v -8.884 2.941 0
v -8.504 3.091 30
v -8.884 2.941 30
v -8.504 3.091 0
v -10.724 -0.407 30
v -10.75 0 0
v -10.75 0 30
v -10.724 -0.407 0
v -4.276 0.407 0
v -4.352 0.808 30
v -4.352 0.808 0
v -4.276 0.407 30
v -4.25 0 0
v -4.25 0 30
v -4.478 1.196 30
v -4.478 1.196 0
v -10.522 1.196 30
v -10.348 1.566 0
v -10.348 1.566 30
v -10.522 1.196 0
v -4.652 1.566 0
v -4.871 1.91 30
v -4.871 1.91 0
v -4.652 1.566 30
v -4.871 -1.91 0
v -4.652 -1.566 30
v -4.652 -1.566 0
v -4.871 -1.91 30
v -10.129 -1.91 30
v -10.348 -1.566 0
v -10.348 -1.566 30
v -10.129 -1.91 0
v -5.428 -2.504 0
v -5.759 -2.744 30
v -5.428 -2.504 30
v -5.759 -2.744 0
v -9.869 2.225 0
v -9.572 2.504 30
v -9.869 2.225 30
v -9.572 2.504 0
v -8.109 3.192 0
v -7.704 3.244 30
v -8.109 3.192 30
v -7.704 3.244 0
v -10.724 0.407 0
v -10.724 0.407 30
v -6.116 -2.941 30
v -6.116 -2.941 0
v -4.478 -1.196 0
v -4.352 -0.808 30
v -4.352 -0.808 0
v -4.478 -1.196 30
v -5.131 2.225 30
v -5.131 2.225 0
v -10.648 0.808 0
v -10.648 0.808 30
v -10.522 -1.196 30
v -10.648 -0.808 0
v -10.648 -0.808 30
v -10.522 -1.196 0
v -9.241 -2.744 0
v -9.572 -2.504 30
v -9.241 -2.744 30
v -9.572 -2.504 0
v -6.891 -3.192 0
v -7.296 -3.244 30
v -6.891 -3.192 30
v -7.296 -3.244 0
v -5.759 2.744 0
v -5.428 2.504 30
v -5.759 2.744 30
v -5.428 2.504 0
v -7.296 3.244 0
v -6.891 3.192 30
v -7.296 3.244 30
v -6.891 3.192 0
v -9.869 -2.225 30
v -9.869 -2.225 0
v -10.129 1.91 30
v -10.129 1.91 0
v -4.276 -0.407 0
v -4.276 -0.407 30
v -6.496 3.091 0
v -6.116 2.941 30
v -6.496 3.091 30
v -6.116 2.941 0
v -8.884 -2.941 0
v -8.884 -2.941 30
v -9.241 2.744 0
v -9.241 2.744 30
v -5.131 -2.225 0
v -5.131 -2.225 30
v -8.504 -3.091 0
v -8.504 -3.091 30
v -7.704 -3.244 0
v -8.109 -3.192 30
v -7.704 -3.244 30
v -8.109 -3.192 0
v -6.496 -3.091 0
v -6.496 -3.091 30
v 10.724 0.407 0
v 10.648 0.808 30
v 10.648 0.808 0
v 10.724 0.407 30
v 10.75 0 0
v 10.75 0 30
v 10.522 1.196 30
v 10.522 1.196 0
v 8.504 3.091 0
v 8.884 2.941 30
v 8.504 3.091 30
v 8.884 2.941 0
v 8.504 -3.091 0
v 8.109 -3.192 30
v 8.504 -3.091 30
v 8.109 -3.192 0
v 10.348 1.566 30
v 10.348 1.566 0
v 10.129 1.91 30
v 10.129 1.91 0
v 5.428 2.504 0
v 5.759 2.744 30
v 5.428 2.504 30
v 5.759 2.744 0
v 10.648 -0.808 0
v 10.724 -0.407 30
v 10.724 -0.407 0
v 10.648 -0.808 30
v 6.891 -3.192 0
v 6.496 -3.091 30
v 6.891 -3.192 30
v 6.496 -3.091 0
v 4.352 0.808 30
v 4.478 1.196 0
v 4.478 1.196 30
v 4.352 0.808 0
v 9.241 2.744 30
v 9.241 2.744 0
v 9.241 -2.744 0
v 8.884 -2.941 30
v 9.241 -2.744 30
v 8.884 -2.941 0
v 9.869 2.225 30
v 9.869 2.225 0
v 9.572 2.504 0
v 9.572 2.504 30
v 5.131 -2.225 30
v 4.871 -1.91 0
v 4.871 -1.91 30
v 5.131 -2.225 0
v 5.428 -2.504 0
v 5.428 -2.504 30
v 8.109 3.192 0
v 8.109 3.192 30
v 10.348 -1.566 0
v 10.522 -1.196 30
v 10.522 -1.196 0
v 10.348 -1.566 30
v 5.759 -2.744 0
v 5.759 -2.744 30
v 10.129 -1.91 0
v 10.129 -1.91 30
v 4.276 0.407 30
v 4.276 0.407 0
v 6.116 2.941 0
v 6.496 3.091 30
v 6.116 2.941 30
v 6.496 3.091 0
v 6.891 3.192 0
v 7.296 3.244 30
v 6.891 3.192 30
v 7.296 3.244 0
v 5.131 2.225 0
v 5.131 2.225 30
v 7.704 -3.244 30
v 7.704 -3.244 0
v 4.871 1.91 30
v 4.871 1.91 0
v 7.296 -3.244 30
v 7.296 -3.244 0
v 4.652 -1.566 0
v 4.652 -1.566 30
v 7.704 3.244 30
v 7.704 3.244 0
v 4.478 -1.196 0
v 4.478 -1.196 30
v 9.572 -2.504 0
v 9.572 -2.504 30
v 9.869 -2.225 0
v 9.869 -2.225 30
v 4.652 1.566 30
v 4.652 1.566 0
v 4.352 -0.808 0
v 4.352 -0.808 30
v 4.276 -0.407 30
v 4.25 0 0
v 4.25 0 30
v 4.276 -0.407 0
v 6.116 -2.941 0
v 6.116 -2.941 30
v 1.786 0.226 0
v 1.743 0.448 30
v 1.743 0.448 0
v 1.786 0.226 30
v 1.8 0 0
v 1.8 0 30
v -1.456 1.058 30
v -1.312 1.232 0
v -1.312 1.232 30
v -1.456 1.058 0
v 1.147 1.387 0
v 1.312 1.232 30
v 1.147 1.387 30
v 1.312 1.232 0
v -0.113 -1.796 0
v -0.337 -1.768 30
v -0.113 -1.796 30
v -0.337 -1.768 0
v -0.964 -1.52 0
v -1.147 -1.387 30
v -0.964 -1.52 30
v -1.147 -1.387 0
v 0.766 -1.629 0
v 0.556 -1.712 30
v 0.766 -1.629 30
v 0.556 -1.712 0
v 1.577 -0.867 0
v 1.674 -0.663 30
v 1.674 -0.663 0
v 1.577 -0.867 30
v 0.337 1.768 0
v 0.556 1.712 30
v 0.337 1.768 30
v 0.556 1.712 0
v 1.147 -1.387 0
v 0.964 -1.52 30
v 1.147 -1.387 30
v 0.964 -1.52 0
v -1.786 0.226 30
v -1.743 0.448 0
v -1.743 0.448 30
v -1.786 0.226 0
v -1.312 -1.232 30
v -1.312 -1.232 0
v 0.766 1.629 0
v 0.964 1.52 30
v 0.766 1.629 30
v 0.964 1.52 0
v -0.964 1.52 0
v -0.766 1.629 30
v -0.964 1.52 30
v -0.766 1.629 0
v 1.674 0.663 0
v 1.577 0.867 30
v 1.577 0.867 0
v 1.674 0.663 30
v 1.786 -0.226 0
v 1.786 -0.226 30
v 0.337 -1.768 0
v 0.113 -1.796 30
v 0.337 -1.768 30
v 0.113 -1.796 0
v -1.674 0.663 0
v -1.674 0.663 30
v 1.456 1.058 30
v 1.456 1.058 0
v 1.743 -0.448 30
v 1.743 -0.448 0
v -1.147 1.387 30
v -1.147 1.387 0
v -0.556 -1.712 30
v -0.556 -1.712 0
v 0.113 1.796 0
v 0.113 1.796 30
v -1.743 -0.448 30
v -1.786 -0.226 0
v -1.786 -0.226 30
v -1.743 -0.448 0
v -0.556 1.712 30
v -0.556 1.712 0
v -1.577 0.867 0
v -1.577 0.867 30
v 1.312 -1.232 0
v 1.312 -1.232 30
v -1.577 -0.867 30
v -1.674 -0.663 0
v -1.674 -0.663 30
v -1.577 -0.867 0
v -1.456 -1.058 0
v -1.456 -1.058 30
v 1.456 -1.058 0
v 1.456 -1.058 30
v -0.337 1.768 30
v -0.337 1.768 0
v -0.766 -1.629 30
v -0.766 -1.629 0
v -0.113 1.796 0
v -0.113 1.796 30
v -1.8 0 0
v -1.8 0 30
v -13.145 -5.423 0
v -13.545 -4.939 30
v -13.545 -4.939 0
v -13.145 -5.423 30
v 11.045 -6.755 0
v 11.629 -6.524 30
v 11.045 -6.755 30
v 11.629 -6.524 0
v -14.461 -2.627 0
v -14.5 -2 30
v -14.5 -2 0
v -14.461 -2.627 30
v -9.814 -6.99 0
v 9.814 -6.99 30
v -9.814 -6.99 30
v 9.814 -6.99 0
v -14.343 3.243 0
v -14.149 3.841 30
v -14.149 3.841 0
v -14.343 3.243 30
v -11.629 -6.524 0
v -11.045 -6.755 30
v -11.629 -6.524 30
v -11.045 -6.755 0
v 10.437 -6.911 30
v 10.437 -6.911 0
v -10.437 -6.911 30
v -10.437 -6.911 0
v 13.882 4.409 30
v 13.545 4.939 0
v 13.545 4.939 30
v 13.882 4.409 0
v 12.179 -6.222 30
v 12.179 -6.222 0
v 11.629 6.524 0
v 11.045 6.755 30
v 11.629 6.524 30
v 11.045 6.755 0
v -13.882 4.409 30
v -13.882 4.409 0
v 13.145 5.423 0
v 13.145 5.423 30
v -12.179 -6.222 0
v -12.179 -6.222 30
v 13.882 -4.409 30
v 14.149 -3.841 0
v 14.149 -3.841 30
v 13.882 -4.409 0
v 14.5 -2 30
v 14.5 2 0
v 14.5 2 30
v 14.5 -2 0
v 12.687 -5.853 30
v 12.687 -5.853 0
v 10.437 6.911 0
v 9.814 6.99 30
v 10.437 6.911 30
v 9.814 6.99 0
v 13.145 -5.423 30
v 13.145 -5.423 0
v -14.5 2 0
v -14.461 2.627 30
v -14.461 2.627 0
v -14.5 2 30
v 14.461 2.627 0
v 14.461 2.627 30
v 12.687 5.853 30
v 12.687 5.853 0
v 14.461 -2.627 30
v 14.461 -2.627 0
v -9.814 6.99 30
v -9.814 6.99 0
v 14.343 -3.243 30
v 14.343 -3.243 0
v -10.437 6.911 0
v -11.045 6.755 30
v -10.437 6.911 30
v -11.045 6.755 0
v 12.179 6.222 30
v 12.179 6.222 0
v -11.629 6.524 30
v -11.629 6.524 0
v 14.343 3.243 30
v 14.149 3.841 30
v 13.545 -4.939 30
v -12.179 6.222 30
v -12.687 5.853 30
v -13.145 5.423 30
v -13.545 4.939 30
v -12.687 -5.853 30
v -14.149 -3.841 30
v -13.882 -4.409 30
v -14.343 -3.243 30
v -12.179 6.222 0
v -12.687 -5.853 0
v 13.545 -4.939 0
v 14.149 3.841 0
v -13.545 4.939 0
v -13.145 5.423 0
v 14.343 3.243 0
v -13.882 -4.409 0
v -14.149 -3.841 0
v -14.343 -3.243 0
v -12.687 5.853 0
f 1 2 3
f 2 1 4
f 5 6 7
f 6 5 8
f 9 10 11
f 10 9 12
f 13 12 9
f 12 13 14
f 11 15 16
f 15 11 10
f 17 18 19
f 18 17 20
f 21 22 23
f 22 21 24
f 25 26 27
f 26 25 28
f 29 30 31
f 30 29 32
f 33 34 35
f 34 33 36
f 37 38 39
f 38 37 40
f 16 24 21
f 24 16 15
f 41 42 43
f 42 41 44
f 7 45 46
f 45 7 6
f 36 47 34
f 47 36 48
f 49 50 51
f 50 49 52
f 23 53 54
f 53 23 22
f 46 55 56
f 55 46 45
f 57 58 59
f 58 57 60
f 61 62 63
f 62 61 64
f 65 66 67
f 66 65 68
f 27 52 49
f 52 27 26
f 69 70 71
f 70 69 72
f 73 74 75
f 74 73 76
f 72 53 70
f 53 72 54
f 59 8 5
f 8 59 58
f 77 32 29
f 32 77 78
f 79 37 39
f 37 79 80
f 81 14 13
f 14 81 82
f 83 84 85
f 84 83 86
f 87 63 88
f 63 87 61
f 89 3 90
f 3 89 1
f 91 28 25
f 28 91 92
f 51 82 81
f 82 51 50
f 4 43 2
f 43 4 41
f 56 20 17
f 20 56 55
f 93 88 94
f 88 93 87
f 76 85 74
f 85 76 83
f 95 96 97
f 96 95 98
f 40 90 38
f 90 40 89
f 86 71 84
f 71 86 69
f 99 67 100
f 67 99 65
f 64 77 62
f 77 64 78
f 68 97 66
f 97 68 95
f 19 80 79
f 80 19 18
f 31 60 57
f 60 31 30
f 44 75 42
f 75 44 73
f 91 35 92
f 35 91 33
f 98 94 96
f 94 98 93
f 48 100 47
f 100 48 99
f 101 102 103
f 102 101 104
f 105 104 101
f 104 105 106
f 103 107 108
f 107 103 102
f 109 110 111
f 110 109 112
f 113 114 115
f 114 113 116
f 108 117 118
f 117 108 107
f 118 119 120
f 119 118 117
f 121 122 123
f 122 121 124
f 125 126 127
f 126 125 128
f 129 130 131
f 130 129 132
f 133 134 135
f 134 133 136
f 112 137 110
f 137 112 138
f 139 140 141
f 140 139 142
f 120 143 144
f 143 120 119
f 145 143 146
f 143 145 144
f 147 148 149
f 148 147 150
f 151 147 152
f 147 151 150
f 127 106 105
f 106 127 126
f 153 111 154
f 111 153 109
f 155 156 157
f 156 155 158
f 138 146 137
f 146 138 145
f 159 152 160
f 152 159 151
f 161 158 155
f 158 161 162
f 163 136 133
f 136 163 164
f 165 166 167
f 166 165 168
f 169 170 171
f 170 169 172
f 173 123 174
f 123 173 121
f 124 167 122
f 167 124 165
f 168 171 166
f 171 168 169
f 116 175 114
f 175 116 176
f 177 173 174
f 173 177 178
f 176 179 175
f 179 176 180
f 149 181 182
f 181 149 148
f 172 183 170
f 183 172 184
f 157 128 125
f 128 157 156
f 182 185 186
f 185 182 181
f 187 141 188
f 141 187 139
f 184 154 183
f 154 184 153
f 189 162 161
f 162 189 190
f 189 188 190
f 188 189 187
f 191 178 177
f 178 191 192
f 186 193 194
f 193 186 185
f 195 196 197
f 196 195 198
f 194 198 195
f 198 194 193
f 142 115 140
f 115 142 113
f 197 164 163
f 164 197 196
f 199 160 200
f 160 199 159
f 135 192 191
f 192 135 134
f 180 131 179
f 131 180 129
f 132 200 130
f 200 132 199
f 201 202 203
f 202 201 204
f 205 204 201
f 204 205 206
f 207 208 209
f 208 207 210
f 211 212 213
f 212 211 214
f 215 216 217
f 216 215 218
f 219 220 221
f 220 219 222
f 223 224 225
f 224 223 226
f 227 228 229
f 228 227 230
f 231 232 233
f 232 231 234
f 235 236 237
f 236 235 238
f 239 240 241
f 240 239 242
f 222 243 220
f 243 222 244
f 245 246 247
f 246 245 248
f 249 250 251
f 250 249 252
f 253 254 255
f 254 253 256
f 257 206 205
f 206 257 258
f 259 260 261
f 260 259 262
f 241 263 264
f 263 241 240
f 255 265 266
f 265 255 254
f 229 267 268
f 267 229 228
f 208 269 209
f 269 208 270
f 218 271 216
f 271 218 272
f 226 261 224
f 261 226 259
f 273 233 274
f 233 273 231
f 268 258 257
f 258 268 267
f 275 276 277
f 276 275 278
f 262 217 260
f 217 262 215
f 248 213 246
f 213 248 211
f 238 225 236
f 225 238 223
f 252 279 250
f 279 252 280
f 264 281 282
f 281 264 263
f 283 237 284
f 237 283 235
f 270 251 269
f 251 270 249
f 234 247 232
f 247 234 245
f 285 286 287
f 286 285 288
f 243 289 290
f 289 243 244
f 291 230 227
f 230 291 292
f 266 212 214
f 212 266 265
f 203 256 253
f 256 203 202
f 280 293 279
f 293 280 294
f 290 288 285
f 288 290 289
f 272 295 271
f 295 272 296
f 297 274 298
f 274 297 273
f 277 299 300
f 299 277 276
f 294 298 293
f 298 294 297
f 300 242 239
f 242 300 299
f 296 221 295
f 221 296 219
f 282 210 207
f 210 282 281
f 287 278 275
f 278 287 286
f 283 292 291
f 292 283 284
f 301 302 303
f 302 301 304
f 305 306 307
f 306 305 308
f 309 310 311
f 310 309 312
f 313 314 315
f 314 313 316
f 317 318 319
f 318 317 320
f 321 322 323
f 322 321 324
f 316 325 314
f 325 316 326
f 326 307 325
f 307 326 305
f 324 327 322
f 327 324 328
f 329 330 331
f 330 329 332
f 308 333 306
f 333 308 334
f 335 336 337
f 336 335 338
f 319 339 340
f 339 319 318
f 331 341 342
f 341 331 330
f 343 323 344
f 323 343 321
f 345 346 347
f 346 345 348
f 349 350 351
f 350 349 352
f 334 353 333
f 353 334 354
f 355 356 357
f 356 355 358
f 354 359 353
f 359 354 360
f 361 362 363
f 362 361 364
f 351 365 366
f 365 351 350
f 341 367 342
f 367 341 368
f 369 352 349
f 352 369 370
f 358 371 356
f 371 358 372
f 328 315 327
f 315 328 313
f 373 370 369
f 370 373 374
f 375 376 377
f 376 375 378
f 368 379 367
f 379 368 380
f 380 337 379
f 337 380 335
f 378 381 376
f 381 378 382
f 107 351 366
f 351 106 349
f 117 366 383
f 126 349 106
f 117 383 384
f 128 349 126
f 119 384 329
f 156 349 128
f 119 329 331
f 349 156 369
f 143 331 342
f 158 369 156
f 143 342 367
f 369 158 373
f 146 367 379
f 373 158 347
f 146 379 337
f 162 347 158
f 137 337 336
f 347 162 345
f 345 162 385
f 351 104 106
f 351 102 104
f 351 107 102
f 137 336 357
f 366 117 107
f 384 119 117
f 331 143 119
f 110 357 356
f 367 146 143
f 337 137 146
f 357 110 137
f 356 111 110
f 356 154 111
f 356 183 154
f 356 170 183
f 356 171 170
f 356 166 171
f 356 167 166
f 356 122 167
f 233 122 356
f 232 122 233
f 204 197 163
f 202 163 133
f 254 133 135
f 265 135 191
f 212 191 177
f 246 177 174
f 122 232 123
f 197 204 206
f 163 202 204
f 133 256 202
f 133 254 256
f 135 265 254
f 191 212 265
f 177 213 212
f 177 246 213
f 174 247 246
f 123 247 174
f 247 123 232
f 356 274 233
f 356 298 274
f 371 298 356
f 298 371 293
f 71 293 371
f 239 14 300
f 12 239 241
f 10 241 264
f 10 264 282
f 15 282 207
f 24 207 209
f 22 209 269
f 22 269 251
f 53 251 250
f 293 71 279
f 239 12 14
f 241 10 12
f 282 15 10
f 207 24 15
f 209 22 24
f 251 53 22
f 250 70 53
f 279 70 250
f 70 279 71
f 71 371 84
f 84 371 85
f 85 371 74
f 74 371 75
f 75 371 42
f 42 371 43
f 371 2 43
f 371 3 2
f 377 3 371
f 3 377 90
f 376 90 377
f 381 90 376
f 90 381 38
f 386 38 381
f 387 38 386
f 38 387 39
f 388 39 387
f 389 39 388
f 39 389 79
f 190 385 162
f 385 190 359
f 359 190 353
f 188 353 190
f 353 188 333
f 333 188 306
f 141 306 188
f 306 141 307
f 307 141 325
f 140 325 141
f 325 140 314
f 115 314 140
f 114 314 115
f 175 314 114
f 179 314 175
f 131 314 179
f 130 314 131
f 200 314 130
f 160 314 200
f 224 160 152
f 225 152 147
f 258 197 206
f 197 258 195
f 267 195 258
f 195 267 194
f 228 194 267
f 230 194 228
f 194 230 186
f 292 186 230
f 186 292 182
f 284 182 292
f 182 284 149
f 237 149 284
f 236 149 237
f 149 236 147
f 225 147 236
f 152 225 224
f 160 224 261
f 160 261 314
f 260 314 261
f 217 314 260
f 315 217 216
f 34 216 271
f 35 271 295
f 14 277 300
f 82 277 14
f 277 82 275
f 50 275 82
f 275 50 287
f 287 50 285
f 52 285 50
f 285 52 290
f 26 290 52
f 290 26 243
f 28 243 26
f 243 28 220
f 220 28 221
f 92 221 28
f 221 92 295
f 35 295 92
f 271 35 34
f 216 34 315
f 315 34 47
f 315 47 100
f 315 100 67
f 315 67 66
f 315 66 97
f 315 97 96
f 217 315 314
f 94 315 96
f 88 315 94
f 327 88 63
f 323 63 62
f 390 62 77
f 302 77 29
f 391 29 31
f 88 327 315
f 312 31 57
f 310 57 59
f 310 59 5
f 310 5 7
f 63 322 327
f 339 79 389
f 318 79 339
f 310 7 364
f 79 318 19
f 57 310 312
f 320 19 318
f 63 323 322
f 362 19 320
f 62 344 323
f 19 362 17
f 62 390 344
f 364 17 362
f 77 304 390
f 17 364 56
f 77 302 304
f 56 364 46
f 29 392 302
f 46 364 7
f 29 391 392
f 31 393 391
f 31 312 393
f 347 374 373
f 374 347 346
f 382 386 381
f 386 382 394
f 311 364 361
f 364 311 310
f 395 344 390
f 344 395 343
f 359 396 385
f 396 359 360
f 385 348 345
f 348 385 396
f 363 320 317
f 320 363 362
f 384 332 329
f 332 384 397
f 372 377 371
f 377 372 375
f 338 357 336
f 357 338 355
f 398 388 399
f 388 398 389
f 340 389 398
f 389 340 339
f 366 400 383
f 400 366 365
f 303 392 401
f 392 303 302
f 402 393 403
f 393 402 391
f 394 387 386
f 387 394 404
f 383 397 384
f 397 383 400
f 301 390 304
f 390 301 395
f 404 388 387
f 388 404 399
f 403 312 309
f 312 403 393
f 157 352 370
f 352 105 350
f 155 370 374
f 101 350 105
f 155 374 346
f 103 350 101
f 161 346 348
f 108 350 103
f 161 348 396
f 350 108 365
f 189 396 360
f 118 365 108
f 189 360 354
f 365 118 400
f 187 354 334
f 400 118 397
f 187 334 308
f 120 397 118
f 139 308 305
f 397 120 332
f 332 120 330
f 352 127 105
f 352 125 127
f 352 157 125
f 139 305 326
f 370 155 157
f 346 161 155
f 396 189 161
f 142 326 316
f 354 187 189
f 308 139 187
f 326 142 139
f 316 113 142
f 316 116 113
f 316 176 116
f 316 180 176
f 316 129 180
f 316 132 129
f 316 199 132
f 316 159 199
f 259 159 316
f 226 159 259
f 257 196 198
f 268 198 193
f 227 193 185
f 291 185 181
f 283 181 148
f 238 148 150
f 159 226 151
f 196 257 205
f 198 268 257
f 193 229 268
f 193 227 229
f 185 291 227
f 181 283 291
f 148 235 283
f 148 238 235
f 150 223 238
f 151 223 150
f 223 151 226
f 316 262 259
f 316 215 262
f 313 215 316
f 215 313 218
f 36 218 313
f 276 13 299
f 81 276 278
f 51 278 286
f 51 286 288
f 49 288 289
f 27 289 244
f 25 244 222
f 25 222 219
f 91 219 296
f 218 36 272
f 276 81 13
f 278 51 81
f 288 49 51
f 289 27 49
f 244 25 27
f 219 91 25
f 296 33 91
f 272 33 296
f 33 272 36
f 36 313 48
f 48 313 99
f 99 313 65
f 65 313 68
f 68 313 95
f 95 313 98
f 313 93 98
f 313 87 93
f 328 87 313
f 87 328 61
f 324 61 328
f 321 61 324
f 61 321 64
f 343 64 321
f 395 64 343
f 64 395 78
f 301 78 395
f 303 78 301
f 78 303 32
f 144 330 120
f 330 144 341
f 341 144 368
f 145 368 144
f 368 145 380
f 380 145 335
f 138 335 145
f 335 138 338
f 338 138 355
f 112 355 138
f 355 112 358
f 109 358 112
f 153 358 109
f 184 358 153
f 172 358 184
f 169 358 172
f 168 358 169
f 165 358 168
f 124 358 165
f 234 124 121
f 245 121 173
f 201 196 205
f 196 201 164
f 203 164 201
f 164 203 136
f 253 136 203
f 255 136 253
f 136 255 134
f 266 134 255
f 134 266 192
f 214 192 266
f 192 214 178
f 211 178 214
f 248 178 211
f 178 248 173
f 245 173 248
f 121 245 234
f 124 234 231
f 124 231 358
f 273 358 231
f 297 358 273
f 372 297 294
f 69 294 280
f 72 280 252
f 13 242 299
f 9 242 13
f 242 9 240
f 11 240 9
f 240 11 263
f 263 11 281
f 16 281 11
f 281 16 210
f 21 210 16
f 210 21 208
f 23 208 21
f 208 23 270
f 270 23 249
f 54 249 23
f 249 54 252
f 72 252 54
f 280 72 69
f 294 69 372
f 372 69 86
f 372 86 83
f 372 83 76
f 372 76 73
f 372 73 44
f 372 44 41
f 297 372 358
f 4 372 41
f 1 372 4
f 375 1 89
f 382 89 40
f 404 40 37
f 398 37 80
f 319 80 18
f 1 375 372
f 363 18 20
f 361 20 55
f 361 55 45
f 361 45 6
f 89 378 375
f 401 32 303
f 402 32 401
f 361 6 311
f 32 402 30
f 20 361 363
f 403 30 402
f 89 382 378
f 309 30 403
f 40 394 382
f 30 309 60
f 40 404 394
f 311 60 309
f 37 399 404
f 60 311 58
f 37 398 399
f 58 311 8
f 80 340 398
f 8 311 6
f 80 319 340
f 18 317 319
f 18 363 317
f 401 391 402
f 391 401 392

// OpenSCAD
$fn = 50;


difference() {
	union() {
		*color(alpha = 1.0000000000, c = "gray") {
			translate(v = [0, 7, 0]) {
				linear_extrude(height = 1) {
					text(font = "Arial:style=Bold", halign = "center", size = 4.5000000000, text = "COMMENT plate main", valign = "center");
				}
			}
		}
		*color(alpha = 1.0000000000, c = "gray") {
			translate(v = [0, 14, 0]) {
				linear_extrude(height = 1) {
					text(font = "Arial:style=Bold", halign = "center", size = 4.5000000000, text = "COMMENT description oobb_plate_shape_p_type_30_depth_2_width_1_height_30_thickness_true_both_holes", valign = "center");
				}
			}
		}
		hull() {
			translate(v = [-9.5000000000, 2.0000000000, 0]) {
				cylinder(h = 30, r = 5);
			}
			translate(v = [9.5000000000, 2.0000000000, 0]) {
				cylinder(h = 30, r = 5);
			}
			translate(v = [-9.5000000000, -2.0000000000, 0]) {
				cylinder(h = 30, r = 5);
			}
			translate(v = [9.5000000000, -2.0000000000, 0]) {
				cylinder(h = 30, r = 5);
			}
		}
	}
	union() {
		*color(alpha = 1.0000000000, c = "gray") {
			translate(v = [0, 7, 0]) {
				linear_extrude(height = 1) {
					text(font = "Arial:style=Bold", halign = "center", size = 4.5000000000, text = "COMMENT holes main", valign = "center");
				}
			}
		}
		*color(alpha = 1.0000000000, c = "gray") {
			translate(v = [0, 14, 0]) {
				linear_extrude(height = 1) {
					text(font = "Arial:style=Bold", halign = "center", size = 4.5000000000, text = "COMMENT description oobb_holes_shape_n_type_2_width_1_height_30_thickness_true_both_holes", valign = "center");
				}
			}
		}
		translate(v = [-7.5000000000, 0.0000000000, 0]) {
			translate(v = [0, 0, -50]) {
				cylinder(h = 100, r = 3.2500000000);
			}
		}
		translate(v = [7.5000000000, 0.0000000000, 0]) {
			translate(v = [0, 0, -50]) {
				cylinder(h = 100, r = 3.2500000000);
			}
		}
		translate(v = [-7.5000000000, 0.0000000000, 0]) {
			translate(v = [0, 0, -50]) {
				cylinder(h = 100, r = 1.8000000000);
			}
		}
		translate(v = [0, 0, -50]) {
			cylinder(h = 100, r = 1.8000000000);
		}
		translate(v = [7.5000000000, 0.0000000000, 0]) {
			translate(v = [0, 0, -50]) {
				cylinder(h = 100, r = 1.8000000000);
			}
		}
	}
}
